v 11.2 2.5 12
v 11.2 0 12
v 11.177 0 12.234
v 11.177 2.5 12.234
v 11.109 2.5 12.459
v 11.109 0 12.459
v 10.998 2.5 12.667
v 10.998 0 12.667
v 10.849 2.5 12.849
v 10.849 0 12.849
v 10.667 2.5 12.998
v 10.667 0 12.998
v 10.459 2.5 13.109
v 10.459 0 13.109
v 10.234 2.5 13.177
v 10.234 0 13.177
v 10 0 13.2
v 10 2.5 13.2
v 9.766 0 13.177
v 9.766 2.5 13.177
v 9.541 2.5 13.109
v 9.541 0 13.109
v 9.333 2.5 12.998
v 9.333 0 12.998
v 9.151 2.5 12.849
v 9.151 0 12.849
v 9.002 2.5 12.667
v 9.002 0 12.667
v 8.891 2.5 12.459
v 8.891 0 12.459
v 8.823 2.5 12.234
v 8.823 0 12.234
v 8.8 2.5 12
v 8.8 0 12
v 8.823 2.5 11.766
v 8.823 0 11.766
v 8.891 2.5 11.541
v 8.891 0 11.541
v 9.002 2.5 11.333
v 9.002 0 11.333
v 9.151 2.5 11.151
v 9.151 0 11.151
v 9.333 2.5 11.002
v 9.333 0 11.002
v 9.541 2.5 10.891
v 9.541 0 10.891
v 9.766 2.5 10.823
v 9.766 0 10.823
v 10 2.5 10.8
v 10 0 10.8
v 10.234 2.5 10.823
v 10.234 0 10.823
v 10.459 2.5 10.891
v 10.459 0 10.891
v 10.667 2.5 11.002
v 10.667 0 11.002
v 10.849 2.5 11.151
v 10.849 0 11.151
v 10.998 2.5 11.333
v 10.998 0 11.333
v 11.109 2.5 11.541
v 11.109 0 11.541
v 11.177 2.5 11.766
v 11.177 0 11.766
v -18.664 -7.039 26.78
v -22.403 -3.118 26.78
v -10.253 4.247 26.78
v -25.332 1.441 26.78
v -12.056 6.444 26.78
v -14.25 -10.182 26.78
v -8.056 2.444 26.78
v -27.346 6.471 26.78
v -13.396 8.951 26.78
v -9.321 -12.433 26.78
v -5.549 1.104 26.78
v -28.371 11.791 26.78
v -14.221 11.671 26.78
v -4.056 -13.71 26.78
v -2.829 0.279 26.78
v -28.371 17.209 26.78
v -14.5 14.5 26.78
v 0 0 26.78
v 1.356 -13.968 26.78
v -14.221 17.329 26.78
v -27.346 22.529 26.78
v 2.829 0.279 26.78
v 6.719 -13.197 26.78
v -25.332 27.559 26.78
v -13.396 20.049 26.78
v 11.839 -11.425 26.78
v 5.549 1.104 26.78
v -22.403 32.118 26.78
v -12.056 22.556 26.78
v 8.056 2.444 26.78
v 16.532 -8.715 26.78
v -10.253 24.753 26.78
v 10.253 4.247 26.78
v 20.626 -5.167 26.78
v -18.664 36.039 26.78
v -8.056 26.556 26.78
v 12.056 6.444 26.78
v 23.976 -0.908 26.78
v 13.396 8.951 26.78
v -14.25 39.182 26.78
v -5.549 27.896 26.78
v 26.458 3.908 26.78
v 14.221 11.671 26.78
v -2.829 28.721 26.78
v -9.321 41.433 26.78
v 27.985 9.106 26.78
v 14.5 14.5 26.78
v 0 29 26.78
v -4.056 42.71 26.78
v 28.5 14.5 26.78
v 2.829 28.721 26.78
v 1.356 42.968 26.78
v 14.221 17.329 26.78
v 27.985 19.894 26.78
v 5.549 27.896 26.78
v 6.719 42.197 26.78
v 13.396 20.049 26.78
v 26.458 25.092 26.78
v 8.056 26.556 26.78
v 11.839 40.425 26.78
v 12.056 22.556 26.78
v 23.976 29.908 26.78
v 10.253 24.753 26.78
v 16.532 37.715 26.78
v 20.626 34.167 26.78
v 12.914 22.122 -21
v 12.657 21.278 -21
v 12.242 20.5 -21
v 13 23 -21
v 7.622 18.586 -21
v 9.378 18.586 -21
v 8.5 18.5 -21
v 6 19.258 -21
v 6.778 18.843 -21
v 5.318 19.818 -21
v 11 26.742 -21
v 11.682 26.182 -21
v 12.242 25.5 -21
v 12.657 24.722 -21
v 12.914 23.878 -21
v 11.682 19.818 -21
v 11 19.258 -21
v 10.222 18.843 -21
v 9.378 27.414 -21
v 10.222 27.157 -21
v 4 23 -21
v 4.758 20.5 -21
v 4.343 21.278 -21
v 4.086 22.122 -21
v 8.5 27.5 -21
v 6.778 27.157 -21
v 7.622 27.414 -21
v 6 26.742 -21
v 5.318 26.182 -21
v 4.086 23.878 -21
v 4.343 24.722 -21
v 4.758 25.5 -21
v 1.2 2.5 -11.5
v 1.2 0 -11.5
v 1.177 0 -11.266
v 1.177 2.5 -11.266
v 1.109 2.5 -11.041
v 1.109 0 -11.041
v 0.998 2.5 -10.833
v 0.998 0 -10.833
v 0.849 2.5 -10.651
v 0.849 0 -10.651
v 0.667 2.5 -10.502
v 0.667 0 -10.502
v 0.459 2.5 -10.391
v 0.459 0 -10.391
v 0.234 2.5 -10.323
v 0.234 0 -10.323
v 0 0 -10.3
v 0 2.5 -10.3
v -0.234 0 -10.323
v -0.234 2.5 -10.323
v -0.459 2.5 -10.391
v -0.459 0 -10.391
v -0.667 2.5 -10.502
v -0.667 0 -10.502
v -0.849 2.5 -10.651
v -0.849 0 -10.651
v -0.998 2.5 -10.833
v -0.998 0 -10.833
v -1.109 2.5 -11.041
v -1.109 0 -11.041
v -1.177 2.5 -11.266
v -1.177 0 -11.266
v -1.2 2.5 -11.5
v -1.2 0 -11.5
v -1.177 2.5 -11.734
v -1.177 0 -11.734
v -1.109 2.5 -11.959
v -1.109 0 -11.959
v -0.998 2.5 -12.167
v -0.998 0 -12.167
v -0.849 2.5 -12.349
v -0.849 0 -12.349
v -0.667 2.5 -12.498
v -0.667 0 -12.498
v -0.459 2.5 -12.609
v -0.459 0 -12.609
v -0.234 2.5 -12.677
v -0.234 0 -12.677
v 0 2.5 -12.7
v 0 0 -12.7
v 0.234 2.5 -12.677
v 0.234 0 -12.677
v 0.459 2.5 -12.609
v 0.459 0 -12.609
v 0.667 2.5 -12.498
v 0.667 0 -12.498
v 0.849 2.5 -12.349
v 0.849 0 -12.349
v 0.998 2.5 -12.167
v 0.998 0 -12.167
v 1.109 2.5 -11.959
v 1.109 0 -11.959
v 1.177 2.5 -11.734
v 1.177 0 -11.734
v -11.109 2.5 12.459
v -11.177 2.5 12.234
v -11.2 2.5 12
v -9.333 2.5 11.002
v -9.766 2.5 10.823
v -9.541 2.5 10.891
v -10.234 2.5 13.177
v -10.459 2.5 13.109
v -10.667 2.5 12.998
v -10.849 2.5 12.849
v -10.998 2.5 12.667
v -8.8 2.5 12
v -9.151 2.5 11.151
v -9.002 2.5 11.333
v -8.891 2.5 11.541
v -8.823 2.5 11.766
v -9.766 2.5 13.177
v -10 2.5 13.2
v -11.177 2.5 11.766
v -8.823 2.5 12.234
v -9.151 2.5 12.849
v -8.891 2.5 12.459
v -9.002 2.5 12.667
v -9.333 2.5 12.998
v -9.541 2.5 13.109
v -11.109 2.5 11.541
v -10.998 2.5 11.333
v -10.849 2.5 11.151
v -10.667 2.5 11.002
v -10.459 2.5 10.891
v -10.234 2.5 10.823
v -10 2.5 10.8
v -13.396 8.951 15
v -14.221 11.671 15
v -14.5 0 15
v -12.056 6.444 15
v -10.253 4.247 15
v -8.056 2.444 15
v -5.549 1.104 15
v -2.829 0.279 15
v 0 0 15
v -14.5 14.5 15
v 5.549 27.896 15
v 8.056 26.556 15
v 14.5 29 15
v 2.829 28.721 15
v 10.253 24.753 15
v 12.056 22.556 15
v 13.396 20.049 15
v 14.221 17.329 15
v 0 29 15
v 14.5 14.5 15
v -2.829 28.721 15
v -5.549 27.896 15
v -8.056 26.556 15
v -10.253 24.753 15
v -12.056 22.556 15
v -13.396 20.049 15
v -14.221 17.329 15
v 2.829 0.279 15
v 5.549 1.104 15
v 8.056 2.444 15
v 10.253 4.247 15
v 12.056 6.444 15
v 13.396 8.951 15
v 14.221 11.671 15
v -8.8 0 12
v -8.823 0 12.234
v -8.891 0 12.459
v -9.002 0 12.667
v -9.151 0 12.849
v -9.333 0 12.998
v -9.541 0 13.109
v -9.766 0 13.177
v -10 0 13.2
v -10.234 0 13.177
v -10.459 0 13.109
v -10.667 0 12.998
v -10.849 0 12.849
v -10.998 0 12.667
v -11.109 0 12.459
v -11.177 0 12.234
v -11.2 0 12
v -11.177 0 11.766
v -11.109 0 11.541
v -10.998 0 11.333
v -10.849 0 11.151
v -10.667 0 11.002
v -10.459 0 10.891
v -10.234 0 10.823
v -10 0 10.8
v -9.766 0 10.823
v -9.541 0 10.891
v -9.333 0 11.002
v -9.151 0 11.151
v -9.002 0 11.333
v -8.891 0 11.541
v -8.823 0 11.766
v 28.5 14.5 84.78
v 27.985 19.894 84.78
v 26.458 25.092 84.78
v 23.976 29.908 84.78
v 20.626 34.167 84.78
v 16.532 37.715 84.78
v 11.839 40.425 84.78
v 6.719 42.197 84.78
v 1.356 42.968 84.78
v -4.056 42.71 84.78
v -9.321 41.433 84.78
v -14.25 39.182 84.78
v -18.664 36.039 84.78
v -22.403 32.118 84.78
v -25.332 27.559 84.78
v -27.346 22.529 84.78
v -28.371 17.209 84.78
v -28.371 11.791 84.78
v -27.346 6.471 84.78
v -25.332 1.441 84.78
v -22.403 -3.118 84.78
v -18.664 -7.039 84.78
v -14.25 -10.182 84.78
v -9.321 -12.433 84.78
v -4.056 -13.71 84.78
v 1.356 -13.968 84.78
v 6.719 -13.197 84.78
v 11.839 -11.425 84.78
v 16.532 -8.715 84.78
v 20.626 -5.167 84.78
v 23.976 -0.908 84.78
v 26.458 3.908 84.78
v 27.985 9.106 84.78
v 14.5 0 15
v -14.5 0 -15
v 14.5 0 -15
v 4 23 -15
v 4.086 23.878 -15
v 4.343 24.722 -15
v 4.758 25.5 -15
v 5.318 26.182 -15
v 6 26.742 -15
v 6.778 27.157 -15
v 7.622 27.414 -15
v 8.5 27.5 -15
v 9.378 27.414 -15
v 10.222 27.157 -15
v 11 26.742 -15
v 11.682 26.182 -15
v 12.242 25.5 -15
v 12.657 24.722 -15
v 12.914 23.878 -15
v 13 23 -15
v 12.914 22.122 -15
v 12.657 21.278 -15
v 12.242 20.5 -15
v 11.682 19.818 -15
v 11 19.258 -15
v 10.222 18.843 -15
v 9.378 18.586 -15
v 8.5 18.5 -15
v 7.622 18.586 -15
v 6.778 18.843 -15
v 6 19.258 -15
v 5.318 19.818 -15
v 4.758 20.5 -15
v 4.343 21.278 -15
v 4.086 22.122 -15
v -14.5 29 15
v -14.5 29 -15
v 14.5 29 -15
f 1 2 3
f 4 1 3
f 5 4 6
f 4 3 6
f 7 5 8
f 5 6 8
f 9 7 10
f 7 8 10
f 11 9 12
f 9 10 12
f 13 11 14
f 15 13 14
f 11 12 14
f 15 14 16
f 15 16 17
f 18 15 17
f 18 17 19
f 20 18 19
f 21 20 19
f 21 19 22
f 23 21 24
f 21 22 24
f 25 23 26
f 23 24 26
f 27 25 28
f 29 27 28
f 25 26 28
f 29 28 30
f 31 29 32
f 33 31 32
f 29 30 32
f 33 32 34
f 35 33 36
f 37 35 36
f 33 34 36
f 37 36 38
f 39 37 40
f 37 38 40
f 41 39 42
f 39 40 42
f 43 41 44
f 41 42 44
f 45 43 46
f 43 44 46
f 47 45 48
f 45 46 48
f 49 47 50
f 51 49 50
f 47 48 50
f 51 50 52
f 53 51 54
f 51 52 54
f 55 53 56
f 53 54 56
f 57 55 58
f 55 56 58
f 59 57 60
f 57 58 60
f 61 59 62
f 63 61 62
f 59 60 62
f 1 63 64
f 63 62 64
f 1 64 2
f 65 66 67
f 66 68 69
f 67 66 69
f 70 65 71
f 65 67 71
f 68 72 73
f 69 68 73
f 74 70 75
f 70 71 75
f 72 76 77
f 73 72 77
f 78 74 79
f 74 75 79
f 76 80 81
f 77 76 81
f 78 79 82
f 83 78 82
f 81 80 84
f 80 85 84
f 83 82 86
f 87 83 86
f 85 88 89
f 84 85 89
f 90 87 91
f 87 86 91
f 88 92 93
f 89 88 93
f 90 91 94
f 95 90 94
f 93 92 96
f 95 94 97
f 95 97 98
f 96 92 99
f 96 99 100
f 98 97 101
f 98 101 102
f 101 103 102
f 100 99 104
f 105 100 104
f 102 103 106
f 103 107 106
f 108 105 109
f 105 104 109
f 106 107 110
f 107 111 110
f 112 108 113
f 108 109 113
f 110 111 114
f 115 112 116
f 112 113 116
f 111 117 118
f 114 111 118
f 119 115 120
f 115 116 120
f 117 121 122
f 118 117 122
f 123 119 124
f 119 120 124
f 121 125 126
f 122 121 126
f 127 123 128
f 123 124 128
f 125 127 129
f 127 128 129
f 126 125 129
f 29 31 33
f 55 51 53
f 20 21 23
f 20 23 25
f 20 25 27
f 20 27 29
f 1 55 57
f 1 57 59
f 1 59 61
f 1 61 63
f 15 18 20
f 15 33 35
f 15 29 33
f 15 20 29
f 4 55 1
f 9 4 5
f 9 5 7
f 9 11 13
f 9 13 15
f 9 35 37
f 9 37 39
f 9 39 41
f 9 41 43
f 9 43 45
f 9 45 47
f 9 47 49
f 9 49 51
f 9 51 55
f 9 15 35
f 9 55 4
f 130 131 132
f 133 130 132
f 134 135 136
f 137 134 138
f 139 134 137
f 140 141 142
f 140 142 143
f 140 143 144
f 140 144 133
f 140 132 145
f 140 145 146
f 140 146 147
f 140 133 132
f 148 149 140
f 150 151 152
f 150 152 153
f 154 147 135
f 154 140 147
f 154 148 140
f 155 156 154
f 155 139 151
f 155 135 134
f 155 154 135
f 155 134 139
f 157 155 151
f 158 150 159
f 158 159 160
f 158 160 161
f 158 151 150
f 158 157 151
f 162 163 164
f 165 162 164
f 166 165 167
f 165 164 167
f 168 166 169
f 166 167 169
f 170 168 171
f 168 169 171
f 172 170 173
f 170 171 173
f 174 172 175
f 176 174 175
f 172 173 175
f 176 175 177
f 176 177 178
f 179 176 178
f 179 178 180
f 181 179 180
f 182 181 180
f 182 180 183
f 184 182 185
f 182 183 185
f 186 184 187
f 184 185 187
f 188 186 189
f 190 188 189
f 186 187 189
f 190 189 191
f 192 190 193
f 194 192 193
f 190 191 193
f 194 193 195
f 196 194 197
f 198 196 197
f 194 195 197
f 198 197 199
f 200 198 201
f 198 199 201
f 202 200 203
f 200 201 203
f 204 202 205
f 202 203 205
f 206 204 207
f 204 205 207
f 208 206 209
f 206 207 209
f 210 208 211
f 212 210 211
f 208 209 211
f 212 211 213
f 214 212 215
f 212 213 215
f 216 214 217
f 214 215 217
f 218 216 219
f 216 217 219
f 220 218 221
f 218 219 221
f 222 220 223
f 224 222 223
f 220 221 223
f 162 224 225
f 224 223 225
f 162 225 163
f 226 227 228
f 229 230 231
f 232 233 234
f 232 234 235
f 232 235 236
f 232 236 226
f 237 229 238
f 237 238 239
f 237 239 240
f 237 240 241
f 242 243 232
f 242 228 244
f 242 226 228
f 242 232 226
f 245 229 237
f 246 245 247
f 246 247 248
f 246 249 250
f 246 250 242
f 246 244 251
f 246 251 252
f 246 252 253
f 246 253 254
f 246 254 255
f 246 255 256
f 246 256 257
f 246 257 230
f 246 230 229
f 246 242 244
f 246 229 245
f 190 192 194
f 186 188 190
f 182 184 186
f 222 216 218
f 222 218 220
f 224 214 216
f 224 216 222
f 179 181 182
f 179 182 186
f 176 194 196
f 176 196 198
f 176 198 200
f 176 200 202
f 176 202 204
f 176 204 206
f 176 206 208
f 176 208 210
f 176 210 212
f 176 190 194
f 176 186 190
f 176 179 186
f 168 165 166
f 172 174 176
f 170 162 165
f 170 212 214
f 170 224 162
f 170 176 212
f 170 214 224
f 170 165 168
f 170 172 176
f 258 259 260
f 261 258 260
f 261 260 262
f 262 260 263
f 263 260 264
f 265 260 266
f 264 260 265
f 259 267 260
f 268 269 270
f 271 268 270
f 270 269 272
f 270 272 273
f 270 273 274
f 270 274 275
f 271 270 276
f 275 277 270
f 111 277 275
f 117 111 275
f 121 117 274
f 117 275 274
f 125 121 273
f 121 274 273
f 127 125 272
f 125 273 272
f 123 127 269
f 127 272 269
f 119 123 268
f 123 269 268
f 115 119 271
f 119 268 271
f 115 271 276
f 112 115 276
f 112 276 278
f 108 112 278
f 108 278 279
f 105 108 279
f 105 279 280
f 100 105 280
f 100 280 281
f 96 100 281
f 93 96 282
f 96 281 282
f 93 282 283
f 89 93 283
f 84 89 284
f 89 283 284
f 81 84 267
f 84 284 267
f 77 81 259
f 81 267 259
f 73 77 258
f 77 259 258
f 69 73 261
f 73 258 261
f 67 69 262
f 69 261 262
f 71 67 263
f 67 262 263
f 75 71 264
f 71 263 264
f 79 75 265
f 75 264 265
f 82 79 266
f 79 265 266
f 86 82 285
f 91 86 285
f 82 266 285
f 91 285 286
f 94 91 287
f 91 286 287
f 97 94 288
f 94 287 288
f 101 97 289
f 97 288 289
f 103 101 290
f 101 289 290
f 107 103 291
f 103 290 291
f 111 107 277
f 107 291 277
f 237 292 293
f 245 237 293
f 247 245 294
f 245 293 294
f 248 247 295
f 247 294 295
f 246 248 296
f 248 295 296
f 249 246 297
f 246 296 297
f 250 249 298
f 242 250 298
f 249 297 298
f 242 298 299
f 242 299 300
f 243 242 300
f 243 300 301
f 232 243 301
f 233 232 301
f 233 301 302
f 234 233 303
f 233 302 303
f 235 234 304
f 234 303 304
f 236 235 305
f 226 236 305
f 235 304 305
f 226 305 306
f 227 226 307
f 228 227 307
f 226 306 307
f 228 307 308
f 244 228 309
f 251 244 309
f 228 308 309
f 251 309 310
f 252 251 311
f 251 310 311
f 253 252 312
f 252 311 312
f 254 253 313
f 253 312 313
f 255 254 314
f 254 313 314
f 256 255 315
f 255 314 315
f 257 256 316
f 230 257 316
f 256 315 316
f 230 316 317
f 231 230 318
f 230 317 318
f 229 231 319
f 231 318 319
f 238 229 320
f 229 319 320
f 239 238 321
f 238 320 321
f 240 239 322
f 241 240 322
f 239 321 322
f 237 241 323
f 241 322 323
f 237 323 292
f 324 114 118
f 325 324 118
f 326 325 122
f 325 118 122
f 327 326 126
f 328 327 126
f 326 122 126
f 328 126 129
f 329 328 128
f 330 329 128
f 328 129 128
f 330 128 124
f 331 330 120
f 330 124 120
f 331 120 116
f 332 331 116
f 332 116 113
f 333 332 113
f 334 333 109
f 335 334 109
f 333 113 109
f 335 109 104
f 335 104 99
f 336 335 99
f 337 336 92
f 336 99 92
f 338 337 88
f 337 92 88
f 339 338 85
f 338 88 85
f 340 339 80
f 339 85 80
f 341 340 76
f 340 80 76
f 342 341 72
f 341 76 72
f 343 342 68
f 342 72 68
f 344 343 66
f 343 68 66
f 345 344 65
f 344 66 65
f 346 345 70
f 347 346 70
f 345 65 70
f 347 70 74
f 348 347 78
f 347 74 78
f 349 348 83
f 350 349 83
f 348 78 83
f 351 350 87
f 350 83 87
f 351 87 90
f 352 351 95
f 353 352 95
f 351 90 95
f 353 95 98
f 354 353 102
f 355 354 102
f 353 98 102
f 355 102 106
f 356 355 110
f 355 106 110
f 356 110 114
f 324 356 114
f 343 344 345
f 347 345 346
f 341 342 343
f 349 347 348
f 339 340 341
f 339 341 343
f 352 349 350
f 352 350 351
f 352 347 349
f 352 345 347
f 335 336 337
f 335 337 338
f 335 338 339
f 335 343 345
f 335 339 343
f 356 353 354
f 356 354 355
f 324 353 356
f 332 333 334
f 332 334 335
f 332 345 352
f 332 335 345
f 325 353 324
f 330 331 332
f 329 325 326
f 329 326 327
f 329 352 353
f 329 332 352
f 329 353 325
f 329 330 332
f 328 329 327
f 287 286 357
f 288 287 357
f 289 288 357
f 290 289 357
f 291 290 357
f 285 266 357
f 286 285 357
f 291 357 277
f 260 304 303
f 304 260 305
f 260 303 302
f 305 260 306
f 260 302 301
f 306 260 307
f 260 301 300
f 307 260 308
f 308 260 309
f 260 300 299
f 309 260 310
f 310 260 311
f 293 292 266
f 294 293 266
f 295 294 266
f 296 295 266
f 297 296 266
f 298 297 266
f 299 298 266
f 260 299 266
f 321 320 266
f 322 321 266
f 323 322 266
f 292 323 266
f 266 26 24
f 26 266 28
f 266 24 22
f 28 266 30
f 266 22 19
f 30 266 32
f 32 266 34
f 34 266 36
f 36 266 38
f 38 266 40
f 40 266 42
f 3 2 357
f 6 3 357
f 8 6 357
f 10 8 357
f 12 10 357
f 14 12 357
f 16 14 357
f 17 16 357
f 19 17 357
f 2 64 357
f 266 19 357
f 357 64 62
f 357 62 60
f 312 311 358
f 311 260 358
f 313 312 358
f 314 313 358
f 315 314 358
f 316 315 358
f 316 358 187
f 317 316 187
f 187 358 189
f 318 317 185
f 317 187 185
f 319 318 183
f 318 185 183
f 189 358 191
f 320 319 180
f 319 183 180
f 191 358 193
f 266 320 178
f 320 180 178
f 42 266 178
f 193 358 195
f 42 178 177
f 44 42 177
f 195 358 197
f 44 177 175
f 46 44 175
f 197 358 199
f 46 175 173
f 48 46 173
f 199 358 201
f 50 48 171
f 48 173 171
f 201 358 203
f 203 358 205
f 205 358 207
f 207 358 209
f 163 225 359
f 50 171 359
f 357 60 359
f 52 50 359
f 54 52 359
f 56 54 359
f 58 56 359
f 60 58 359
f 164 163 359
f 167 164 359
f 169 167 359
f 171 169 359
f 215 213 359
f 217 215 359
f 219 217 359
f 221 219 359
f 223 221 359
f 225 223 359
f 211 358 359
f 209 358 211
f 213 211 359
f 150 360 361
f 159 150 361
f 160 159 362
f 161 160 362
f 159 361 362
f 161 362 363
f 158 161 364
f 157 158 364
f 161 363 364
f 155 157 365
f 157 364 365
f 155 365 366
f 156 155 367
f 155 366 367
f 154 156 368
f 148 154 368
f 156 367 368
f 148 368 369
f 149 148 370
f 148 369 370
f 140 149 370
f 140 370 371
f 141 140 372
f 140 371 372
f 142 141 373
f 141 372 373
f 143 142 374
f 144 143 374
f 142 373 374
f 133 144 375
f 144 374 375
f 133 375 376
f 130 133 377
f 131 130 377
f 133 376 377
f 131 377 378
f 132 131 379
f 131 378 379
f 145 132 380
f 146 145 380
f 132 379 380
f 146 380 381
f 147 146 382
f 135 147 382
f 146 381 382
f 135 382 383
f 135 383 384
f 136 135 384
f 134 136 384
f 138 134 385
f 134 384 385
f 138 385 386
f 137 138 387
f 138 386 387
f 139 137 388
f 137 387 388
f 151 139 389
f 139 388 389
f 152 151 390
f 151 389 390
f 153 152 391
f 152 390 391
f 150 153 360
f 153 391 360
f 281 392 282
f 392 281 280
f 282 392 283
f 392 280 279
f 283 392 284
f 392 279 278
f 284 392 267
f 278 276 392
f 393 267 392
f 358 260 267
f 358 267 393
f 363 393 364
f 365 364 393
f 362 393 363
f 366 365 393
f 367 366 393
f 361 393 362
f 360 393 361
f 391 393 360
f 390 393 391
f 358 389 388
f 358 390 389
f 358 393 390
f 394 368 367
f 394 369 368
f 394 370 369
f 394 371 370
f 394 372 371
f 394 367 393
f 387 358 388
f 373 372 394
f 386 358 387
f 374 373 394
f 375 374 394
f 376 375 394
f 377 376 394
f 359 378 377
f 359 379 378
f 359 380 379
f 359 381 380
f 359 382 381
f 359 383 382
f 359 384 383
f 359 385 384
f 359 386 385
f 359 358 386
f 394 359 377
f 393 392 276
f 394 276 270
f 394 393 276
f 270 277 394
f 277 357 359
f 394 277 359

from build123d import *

# Parameters (mm, degrees)
SKETCH1_W           = 29
SKETCH1_H           = 30
BOSS_EXTRUDE1_DEPTH = 29
SKETCH2_R           = 14.5
BOSS_EXTRUDE2_DEPTH = 11.78
SKETCH3_R           = 1.2
CUT_EXTRUDE1_DEPTH  = 2.5
SKETCH4_R           = 4.5
BOSS_EXTRUDE3_DEPTH = 6
SKETCH5_R           = 28.5
BOSS_EXTRUDE4_DEPTH = 58


with BuildPart() as part:
    # Sketch1 → Boss-Extrude1 (new body)
    with BuildSketch(Plane(origin=(0, 0, 0), x_dir=(1, 0, 0), z_dir=(0, 1, 0))):
        Rectangle(SKETCH1_W, SKETCH1_H)
    extrude(amount=BOSS_EXTRUDE1_DEPTH)

    # Sketch2 → Boss-Extrude2 (add)
    with BuildSketch(Plane.XY.offset(15)):
        with Locations((0, 14.5)):
            Circle(SKETCH2_R)
    extrude(amount=BOSS_EXTRUDE2_DEPTH)

    # Sketch3 → Cut-Extrude1 (cut)
    with BuildSketch(Plane.XZ):
        with Locations((-10, 12)):
            Circle(SKETCH3_R)
        with Locations((10, 12)):
            Circle(SKETCH3_R)
        with Locations((0, -11.5)):
            Circle(SKETCH3_R)
    extrude(amount=-CUT_EXTRUDE1_DEPTH, mode=Mode.SUBTRACT)

    # Sketch4 → Boss-Extrude3 (add)
    with BuildSketch(Plane(origin=(0, 0, -15), x_dir=(-1, 0, 0), z_dir=(0, 0, -1))):
        with Locations((-8.5, 23)):
            Circle(SKETCH4_R)
    extrude(amount=BOSS_EXTRUDE3_DEPTH)

    # Sketch5 → Boss-Extrude4 (add)
    with BuildSketch(Plane.XY.offset(26.78)):
        with Locations((0, 14.5)):
            Circle(SKETCH5_R)
    extrude(amount=BOSS_EXTRUDE4_DEPTH)


solid = part.part
